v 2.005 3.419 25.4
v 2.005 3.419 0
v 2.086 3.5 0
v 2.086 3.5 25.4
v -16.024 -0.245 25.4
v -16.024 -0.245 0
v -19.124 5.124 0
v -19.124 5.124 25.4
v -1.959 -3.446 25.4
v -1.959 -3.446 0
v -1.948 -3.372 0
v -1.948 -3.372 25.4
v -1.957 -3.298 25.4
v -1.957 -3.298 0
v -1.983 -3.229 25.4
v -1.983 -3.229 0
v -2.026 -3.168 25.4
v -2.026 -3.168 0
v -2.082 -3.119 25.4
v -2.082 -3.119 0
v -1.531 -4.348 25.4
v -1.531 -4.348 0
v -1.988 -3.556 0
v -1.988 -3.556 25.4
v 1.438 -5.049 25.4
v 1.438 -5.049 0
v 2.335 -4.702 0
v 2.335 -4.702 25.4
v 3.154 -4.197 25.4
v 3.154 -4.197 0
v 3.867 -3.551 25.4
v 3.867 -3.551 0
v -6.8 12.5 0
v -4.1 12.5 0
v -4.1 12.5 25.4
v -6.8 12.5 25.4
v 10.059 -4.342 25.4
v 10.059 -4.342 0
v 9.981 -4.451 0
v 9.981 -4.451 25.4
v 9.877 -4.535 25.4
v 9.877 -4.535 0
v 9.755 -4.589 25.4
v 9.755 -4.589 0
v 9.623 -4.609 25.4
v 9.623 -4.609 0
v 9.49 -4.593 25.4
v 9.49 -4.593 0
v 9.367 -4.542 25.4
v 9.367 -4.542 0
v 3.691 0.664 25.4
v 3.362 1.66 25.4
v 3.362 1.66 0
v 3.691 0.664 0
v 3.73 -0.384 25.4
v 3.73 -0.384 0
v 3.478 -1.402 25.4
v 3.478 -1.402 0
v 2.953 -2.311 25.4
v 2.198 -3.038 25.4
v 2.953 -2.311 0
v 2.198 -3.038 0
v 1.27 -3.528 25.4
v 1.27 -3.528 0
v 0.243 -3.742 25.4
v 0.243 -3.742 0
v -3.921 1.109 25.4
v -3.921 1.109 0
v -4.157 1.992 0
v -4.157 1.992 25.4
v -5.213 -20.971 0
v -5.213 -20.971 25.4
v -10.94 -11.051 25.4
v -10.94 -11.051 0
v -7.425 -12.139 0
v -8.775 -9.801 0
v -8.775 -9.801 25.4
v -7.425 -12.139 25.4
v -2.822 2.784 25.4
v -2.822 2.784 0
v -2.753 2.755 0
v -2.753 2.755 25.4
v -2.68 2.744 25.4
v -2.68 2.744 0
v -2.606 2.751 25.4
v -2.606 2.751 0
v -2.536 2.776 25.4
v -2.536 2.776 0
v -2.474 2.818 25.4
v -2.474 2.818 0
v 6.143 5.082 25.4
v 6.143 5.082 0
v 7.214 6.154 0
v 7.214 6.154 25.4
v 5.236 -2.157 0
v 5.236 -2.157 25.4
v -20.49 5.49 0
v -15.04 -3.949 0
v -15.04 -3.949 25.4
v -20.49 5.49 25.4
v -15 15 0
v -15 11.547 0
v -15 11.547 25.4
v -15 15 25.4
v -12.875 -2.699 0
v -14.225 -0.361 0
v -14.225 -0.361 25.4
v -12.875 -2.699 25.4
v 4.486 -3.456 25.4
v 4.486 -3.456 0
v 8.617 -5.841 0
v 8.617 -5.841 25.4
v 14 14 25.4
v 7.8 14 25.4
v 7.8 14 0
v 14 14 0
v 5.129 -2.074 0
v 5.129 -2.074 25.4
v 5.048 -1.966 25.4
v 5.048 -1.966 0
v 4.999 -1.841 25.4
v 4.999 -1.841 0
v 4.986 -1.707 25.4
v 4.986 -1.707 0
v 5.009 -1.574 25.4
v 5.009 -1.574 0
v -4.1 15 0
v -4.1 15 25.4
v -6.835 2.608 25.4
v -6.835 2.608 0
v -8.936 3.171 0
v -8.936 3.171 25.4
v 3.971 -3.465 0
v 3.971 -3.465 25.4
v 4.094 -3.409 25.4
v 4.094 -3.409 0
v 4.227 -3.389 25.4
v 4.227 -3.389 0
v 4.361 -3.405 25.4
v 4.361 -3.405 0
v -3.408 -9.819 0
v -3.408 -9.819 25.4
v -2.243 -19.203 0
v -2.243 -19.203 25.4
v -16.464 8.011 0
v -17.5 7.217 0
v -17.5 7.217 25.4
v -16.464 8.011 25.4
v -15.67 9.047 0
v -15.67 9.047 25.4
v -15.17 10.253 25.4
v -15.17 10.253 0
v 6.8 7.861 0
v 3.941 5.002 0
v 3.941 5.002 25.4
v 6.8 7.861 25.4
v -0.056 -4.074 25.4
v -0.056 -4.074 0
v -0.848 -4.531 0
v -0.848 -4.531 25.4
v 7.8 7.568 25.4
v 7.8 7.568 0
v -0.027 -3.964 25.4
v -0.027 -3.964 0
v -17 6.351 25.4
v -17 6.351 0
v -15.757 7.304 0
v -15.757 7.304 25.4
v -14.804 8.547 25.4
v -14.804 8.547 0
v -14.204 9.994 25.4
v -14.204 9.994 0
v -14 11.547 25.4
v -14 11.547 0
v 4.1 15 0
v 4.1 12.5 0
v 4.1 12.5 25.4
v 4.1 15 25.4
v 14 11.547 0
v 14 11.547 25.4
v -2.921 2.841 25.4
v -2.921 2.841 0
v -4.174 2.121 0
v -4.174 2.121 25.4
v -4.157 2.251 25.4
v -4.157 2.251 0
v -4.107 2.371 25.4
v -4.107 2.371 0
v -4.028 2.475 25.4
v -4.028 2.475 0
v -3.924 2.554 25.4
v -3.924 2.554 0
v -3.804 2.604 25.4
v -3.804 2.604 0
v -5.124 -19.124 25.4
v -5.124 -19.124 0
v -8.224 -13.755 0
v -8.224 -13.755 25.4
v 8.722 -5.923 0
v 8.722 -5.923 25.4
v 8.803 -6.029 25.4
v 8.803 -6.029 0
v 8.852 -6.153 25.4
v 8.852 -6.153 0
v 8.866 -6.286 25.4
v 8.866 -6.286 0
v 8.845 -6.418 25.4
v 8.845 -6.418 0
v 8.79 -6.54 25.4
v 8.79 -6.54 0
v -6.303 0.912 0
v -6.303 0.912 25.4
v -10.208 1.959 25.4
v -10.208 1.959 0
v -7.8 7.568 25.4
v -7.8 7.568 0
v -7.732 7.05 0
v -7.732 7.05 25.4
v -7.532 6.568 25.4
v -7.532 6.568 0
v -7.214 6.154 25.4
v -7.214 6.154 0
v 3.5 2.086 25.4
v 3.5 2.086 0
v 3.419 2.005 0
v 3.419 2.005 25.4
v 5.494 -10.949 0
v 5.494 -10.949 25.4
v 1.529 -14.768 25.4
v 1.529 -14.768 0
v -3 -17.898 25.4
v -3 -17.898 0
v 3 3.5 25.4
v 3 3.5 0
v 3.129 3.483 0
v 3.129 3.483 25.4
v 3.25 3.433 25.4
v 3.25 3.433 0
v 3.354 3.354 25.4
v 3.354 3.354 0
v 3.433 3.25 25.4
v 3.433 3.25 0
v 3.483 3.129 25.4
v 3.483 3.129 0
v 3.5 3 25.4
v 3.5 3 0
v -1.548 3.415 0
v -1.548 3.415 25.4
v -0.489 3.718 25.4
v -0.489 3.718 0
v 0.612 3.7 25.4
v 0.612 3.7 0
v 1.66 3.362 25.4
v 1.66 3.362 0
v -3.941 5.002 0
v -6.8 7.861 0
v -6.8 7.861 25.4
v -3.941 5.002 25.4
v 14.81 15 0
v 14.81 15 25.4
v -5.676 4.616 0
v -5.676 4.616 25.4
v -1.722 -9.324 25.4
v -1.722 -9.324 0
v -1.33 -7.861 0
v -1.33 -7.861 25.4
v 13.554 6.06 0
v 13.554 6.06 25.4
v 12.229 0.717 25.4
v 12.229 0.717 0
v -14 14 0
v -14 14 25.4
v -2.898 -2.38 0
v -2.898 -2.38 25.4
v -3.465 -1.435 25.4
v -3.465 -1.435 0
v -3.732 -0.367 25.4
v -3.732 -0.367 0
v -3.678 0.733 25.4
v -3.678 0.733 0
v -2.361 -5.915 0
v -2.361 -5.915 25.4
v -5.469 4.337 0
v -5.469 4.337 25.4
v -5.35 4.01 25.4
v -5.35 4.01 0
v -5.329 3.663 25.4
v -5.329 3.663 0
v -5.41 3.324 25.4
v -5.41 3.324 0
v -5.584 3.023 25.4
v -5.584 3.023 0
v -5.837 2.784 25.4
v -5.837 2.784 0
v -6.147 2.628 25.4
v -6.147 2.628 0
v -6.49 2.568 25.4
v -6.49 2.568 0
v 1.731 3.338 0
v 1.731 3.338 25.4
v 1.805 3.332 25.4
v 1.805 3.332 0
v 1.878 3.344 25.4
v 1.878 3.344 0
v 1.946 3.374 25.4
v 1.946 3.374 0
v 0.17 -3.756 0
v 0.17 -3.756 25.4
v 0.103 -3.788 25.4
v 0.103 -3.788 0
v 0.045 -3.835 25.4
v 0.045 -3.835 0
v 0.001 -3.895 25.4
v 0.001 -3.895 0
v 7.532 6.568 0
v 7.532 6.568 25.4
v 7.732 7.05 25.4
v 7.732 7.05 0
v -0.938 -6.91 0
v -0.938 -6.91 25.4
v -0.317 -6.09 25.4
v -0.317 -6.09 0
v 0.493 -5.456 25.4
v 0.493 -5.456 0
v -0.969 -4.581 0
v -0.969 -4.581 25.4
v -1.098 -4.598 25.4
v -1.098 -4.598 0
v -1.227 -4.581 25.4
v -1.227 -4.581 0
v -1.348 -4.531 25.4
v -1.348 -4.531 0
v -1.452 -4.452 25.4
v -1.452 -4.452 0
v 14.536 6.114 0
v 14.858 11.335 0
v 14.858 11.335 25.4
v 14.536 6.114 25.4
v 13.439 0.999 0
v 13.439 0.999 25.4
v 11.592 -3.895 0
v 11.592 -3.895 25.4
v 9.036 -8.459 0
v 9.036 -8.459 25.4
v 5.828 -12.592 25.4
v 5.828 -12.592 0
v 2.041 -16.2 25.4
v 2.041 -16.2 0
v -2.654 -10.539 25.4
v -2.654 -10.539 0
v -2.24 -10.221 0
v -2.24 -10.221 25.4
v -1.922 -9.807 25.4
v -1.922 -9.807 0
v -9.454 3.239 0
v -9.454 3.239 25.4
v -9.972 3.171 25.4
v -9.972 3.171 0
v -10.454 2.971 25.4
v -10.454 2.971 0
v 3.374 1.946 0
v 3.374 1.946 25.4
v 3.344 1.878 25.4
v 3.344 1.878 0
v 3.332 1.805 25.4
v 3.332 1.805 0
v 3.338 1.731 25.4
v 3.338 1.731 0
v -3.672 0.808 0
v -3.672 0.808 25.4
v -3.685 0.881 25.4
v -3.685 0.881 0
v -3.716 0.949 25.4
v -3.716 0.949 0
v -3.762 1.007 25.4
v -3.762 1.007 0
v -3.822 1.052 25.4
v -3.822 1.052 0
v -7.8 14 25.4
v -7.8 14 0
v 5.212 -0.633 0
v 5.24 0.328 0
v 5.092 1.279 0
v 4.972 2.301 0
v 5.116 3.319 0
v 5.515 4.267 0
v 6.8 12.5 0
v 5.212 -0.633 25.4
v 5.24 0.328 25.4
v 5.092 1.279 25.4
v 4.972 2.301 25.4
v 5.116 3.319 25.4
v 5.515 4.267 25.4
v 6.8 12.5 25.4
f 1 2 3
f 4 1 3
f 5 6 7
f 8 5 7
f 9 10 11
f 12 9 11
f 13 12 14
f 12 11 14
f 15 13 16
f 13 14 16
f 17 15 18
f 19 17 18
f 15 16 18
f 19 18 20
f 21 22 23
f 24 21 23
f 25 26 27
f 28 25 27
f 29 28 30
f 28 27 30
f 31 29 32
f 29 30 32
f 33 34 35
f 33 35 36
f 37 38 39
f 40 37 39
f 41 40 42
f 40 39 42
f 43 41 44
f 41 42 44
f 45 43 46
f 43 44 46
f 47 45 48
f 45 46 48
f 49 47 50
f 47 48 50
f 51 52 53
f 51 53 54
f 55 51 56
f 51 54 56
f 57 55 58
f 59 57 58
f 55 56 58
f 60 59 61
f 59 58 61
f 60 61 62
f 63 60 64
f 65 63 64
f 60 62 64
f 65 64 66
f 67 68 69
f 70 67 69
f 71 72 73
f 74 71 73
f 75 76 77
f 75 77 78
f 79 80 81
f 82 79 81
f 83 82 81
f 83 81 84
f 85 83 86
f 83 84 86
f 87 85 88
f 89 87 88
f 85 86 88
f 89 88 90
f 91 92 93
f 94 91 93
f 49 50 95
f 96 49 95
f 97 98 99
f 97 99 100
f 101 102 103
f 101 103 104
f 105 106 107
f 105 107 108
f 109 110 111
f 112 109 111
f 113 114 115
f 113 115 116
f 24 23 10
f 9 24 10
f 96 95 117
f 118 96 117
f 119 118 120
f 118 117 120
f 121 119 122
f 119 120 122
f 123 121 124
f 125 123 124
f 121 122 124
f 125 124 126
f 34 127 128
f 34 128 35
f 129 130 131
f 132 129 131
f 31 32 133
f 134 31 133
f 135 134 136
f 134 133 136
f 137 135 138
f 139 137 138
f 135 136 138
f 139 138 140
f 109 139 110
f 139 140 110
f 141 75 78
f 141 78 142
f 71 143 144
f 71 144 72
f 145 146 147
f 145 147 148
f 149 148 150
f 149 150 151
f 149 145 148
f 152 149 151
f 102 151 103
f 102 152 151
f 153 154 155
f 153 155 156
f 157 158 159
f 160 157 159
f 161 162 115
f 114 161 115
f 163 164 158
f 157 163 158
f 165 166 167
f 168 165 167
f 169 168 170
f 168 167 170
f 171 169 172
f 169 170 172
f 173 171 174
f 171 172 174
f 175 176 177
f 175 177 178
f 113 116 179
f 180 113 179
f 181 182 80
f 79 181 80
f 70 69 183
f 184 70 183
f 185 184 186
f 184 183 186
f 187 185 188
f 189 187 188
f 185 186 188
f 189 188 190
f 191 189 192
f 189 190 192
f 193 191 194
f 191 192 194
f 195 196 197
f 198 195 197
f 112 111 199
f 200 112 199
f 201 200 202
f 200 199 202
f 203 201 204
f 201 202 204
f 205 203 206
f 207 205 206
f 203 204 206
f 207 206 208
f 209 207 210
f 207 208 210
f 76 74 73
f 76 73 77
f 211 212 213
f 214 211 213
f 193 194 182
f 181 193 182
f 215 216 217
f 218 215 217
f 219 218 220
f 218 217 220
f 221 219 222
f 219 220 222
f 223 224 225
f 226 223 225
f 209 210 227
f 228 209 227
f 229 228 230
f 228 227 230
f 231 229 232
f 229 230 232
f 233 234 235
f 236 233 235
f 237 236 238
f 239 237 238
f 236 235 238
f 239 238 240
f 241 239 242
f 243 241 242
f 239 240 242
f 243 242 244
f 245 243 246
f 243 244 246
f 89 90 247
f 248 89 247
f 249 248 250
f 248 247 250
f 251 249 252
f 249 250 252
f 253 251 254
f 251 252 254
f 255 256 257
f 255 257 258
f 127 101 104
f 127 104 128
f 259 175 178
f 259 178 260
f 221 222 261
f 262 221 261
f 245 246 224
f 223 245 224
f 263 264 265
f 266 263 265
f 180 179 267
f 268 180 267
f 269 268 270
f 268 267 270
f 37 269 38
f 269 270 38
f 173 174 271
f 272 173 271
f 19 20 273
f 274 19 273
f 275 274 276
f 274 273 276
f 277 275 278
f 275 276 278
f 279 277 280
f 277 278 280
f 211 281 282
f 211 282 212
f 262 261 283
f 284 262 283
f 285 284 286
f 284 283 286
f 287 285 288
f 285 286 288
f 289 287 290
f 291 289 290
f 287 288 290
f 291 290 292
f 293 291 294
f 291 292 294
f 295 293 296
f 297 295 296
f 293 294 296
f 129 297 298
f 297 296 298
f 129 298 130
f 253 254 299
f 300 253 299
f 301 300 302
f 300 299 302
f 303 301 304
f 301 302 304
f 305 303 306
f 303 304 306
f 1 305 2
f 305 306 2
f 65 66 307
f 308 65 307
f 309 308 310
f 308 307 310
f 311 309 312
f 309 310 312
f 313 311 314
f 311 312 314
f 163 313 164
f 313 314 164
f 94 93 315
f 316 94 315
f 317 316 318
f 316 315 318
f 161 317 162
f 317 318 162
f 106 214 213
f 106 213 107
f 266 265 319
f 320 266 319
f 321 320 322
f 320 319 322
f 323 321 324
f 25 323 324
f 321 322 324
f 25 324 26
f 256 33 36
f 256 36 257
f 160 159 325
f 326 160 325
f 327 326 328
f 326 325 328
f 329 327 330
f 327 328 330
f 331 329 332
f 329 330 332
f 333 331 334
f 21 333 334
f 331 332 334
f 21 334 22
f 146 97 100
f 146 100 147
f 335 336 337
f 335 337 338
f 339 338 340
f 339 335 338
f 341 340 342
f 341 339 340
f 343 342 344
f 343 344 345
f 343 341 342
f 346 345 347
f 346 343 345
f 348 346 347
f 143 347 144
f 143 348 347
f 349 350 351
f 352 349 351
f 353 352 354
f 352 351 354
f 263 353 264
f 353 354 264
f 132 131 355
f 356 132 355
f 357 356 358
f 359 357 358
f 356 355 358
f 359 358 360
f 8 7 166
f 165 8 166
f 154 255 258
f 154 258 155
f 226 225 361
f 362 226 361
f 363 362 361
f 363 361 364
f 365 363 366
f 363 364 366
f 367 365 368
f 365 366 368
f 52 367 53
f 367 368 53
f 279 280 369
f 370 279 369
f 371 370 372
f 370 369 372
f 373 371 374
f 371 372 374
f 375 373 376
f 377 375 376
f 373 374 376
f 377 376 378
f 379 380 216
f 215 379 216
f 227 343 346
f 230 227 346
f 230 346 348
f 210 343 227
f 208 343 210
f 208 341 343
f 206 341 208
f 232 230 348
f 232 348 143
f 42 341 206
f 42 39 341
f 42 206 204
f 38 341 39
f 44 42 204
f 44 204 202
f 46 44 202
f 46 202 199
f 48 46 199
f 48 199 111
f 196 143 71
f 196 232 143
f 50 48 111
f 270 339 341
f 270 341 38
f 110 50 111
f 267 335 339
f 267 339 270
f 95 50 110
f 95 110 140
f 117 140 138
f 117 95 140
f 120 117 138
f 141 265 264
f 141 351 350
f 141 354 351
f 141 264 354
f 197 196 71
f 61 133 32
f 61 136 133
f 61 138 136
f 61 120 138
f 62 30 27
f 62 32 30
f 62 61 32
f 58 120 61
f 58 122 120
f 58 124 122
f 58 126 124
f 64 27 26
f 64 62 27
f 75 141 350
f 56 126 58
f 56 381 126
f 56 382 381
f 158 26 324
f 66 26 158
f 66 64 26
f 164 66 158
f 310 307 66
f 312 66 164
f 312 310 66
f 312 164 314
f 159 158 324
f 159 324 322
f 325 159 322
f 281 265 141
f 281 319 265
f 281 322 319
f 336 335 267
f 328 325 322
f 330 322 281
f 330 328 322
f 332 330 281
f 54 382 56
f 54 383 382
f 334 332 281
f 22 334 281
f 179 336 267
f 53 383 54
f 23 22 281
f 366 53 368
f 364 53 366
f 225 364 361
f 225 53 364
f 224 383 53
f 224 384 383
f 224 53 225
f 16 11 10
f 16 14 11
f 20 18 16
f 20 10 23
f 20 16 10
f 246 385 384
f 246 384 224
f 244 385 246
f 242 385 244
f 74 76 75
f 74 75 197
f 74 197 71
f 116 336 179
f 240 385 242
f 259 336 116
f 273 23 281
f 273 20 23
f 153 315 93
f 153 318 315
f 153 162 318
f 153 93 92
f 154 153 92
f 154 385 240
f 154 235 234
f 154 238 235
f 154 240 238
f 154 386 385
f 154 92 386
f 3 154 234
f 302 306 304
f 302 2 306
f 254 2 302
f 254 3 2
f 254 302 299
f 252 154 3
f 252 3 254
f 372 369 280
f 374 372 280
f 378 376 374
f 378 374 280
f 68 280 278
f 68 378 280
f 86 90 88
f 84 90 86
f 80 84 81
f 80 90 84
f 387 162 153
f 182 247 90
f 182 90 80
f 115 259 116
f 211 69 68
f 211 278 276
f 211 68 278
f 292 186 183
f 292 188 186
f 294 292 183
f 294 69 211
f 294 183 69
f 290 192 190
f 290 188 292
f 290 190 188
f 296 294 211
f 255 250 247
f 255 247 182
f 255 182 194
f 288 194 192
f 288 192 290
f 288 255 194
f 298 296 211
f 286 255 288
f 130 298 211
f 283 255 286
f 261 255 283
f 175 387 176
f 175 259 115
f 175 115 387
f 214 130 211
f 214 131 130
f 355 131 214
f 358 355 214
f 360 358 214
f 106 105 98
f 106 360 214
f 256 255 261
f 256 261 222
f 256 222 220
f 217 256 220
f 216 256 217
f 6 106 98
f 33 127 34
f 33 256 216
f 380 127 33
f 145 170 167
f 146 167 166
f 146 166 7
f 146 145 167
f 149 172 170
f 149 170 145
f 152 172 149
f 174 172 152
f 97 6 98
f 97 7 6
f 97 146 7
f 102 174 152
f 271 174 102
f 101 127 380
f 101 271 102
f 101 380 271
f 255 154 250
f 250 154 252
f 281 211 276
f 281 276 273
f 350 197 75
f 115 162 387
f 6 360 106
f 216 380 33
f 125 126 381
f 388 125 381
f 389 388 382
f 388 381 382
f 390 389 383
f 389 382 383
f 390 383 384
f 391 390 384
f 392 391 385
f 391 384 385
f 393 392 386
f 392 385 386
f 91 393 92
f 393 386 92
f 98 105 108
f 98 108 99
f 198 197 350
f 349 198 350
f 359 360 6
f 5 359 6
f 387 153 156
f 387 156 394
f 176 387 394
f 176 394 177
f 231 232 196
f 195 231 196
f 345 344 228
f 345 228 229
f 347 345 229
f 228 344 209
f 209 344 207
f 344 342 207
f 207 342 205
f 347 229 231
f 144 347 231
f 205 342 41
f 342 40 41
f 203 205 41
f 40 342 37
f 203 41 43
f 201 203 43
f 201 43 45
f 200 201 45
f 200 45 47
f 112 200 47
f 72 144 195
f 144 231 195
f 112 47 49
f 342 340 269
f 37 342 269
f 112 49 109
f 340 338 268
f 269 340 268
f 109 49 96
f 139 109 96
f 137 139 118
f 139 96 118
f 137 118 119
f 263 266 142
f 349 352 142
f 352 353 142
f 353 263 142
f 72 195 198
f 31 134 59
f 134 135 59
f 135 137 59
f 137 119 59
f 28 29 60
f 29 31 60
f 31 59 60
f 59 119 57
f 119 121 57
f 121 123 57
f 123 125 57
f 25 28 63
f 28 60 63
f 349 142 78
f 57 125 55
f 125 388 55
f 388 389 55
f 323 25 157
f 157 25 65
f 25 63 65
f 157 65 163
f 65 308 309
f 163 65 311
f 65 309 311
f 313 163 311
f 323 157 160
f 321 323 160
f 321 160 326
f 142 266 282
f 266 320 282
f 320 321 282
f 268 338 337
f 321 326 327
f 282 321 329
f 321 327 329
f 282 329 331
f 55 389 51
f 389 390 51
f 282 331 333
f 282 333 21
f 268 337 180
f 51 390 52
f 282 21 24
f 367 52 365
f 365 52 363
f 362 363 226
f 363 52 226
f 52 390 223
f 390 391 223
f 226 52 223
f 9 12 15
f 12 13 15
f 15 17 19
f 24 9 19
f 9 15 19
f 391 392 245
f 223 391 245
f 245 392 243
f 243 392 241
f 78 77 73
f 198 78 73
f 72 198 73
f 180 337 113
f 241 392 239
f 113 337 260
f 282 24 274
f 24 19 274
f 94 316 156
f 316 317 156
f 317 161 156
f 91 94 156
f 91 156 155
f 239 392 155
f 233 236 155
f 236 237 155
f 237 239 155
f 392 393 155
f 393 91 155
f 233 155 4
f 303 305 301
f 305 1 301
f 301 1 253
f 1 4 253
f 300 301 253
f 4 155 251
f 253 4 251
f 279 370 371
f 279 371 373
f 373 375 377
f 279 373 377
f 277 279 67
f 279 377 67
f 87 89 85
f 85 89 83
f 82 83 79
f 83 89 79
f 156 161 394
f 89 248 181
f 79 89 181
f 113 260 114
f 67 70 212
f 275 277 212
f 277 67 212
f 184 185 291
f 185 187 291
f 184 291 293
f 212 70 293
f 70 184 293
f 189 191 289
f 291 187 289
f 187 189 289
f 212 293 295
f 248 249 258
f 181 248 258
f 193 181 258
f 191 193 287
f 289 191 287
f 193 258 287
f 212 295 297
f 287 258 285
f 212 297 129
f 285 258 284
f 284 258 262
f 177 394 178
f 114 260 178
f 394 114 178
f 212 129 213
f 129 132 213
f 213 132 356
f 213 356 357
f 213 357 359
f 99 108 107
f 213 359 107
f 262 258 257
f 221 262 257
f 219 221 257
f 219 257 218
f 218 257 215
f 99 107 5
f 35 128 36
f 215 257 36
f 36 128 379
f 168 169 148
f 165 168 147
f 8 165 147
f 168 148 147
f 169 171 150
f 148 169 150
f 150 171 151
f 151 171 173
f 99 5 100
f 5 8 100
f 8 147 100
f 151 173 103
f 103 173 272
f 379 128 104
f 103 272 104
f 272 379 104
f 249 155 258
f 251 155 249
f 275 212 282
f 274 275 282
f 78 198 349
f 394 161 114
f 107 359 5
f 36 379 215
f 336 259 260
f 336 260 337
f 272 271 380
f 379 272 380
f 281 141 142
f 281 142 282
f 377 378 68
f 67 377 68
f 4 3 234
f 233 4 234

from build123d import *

# Parameters (mm, degrees)
EXTRUSION4_DEPTH = 25.4


with BuildPart() as part:
    # Sketch1 → Extrusion4 (new body)
    with BuildSketch(Plane.XY):
        with BuildLine():
            Line((-14.999999918, 14.999999985), (-4.099998388, 14.999999985))
            Line((-4.099998388, 14.999999985), (-4.099998388, 12.499999985))
            Line((-4.099998388, 12.499999985), (-6.799995338, 12.499999985))
            Line((-6.799995338, 12.499999985), (-6.799995338, 7.860655585))
            Line((-6.799995338, 7.860655585), (-3.941497908, 5.002158155))
            Line((-3.941497908, 5.002158155), (3.941498082, 5.002158155))
            Line((3.941498082, 5.002158155), (6.799995512, 7.860655585))
            Line((6.799995512, 7.860655585), (6.799995512, 12.499999985))
            Line((6.799995512, 12.499999985), (4.099998562, 12.499999985))
            Line((4.099998562, 12.499999985), (4.099998562, 14.999999985))
            Line((4.099998562, 14.999999985), (14.810114901, 14.999999985))
            Line((14.810114901, 14.999999985), (14.858211116, 11.334807121))
            ThreePointArc((14.858211116, 11.334807121), (10.399126577, -6.225213544), (-2.242564242, -19.203095263))
            Line((-2.242564242, -19.203095263), (-5.213160142, -20.9705416))
            Line((-5.213160142, -20.9705416), (-10.940381729, -11.050702829))
            Line((-10.940381729, -11.050702829), (-8.775318226, -9.800702836))
            Line((-8.775318226, -9.800702836), (-7.425319757, -12.138968783))
            Line((-7.425319757, -12.138968783), (-3.407529648, -9.819296585))
            Line((-3.407529648, -9.819296585), (-2.361246978, -5.914516485))
            Line((-2.361246978, -5.914516485), (-6.302744968, 0.912358295))
            Line((-6.302744968, 0.912358295), (-10.207525068, 1.958640965))
            Line((-10.207525068, 1.958640965), (-14.225315169, -0.361031229))
            Line((-14.225315169, -0.361031229), (-12.875316699, -2.699297177))
            Line((-12.875316699, -2.699297177), (-15.040380206, -3.949297173))
            Line((-15.040380206, -3.949297173), (-20.490380962, 5.490381032))
            Line((-20.490380962, 5.490381032), (-17.499999918, 7.216878355))
            ThreePointArc((-17.499999918, 7.216878355), (-15.669872899, 9.047005374), (-14.999999918, 11.547005375))
            Line((-14.999999918, 11.547005375), (-14.999999918, 14.999999985))
        make_face()
        with BuildLine():
            Line((-3.803644053, 2.604283261), (-2.920581563, 2.840899141))
            Line((-2.920581563, 2.840899141), (-2.821802903, 2.783869251))
            ThreePointArc((-2.821802903, 2.783869251), (-2.642326542, 2.745128481), (-2.473891573, 2.818219331))
            ThreePointArc((-2.473891573, 2.818219331), (-0.48947315, 3.717918241), (1.660187067, 3.362481111))
            ThreePointArc((1.660187067, 3.362481111), (1.841800057, 3.335474951), (2.005134057, 3.419347561))
            Line((2.005134057, 3.419347561), (2.085786497, 3.500000001))
            Line((2.085786497, 3.500000001), (3.000000057, 3.500000001))
            ThreePointArc((3.000000057, 3.500000001), (3.353553447, 3.353553391), (3.500000057, 3.000000001))
            Line((3.500000057, 3.000000001), (3.500000057, 2.085786441))
            Line((3.500000057, 2.085786441), (3.419347617, 2.005134001))
            ThreePointArc((3.419347617, 2.005134001), (3.335475004, 1.841799992), (3.362481172, 1.660186995))
            ThreePointArc((3.362481172, 1.660186995), (3.247595339, -1.874999996), (0.243476512, -3.742087545))
            ThreePointArc((0.243476512, -3.742087545), (0.072691963, -3.809506014), (-0.026823118, -3.963808835))
            Line((-0.026823118, -3.963808835), (-0.056343958, -4.073982115))
            Line((-0.056343958, -4.073982115), (-0.848076128, -4.531088895))
            ThreePointArc((-0.848076128, -4.531088895), (-1.227485649, -4.581039105), (-1.531088828, -4.348076195))
            Line((-1.531088828, -4.348076195), (-1.988195608, -3.556344025))
            Line((-1.988195608, -3.556344025), (-1.958674768, -3.446170745))
            ThreePointArc((-1.958674768, -3.446170745), (-1.967705959, -3.262783044), (-2.081900468, -3.119004655))
            ThreePointArc((-2.081900468, -3.119004655), (-3.464548158, -1.435062862), (-3.677595258, 0.733343355))
            ThreePointArc((-3.677595258, 0.733343355), (-3.698514209, 0.915757746), (-3.821802888, 1.051818445))
            Line((-3.821802888, 1.051818445), (-3.920581548, 1.108848335))
            Line((-3.920581548, 1.108848335), (-4.157197428, 1.991910825))
            ThreePointArc((-4.157197428, 1.991910825), (-4.10724722, 2.371320342), (-3.803644053, 2.604283261))
        make_face(mode=Mode.SUBTRACT)
        with BuildLine():
            Line((-13.999999918, 11.547005365), (-13.999999918, 13.999999985))
            Line((-13.999999918, 13.999999985), (-7.799995348, 13.999999985))
            Line((-7.799995348, 13.999999985), (-7.799995348, 7.567762365))
            ThreePointArc((-7.799995348, 7.567762365), (-7.647754416, 6.802395499), (-7.214208908, 6.153548805))
            Line((-7.214208908, 6.153548805), (-5.676298958, 4.615638855))
            ThreePointArc((-5.676298958, 4.615638855), (-5.485596608, 3.167110716), (-6.835409948, 2.607999725))
            Line((-6.835409948, 2.607999725), (-8.936234008, 3.170913835))
            ThreePointArc((-8.936234008, 3.170913835), (-9.714924484, 3.221951904), (-10.453872098, 2.971112985))
            Line((-10.453872098, 2.971112985), (-16.024353279, -0.245005824))
            Line((-16.024353279, -0.245005824), (-19.124355567, 5.124355624))
            Line((-19.124355567, 5.124355624), (-16.999999918, 6.350852945))
            ThreePointArc((-16.999999918, 6.350852945), (-14.803847494, 8.547005366), (-13.999999918, 11.547005365))
        make_face(mode=Mode.SUBTRACT)
        with BuildLine():
            Line((7.799995502, 7.567762365), (7.799995491, 13.999999985))
            Line((7.799995491, 13.999999985), (14.000000062, 13.999999985))
            Line((14.000000062, 13.999999985), (14.000000062, 11.547005385))
            ThreePointArc((14.000000062, 11.547005385), (12.9999649, 3.361510856), (10.058687082, -4.342467065))
            ThreePointArc((10.058687082, -4.342467065), (9.755046631, -4.589262395), (9.366647572, -4.541811055))
            Line((9.366647572, -4.541811055), (5.235555602, -2.156723995))
            ThreePointArc((5.235555602, -2.156723995), (5.019640061, -1.905157444), (5.008550772, -1.573823355))
            ThreePointArc((5.008550772, -1.573823355), (5.247767117, -0.153104957), (5.091786812, 1.279143405))
            ThreePointArc((5.091786812, 1.279143405), (5.115772962, 3.319255937), (6.142816242, 5.082155985))
            Line((6.142816242, 5.082155985), (7.214209062, 6.153548805))
            ThreePointArc((7.214209062, 6.153548805), (7.647754561, 6.802395503), (7.799995502, 7.567762365))
        make_face(mode=Mode.SUBTRACT)
        with BuildLine():
            Line((-1.722025028, -9.324462665), (-1.329868038, -7.860912855))
            ThreePointArc((-1.329868038, -7.860912855), (-0.316673452, -6.090017259), (1.438122752, -5.049188375))
            ThreePointArc((1.438122752, -5.049188375), (2.756476373, -4.4681471), (3.867246431, -3.550620473))
            ThreePointArc((3.867246431, -3.550620473), (4.159734815, -3.394557032), (4.485555611, -3.455762103))
            Line((4.485555611, -3.455762103), (8.616647581, -5.840849163))
            ThreePointArc((8.616647581, -5.840849163), (8.851941182, -6.153486949), (8.790030382, -6.539844965))
            ThreePointArc((8.790030382, -6.539844965), (3.588828705, -12.939055237), (-2.999999918, -17.897858355))
            Line((-2.999999918, -17.897858355), (-5.124355566, -19.12435565))
            Line((-5.124355566, -19.12435565), (-8.224357859, -13.754994194))
            Line((-8.224357859, -13.754994194), (-2.653876678, -10.538875385))
            ThreePointArc((-2.653876678, -10.538875385), (-2.067169998, -10.024347435), (-1.722025028, -9.324462665))
        make_face(mode=Mode.SUBTRACT)
    extrude(amount=EXTRUSION4_DEPTH)


solid = part.part
